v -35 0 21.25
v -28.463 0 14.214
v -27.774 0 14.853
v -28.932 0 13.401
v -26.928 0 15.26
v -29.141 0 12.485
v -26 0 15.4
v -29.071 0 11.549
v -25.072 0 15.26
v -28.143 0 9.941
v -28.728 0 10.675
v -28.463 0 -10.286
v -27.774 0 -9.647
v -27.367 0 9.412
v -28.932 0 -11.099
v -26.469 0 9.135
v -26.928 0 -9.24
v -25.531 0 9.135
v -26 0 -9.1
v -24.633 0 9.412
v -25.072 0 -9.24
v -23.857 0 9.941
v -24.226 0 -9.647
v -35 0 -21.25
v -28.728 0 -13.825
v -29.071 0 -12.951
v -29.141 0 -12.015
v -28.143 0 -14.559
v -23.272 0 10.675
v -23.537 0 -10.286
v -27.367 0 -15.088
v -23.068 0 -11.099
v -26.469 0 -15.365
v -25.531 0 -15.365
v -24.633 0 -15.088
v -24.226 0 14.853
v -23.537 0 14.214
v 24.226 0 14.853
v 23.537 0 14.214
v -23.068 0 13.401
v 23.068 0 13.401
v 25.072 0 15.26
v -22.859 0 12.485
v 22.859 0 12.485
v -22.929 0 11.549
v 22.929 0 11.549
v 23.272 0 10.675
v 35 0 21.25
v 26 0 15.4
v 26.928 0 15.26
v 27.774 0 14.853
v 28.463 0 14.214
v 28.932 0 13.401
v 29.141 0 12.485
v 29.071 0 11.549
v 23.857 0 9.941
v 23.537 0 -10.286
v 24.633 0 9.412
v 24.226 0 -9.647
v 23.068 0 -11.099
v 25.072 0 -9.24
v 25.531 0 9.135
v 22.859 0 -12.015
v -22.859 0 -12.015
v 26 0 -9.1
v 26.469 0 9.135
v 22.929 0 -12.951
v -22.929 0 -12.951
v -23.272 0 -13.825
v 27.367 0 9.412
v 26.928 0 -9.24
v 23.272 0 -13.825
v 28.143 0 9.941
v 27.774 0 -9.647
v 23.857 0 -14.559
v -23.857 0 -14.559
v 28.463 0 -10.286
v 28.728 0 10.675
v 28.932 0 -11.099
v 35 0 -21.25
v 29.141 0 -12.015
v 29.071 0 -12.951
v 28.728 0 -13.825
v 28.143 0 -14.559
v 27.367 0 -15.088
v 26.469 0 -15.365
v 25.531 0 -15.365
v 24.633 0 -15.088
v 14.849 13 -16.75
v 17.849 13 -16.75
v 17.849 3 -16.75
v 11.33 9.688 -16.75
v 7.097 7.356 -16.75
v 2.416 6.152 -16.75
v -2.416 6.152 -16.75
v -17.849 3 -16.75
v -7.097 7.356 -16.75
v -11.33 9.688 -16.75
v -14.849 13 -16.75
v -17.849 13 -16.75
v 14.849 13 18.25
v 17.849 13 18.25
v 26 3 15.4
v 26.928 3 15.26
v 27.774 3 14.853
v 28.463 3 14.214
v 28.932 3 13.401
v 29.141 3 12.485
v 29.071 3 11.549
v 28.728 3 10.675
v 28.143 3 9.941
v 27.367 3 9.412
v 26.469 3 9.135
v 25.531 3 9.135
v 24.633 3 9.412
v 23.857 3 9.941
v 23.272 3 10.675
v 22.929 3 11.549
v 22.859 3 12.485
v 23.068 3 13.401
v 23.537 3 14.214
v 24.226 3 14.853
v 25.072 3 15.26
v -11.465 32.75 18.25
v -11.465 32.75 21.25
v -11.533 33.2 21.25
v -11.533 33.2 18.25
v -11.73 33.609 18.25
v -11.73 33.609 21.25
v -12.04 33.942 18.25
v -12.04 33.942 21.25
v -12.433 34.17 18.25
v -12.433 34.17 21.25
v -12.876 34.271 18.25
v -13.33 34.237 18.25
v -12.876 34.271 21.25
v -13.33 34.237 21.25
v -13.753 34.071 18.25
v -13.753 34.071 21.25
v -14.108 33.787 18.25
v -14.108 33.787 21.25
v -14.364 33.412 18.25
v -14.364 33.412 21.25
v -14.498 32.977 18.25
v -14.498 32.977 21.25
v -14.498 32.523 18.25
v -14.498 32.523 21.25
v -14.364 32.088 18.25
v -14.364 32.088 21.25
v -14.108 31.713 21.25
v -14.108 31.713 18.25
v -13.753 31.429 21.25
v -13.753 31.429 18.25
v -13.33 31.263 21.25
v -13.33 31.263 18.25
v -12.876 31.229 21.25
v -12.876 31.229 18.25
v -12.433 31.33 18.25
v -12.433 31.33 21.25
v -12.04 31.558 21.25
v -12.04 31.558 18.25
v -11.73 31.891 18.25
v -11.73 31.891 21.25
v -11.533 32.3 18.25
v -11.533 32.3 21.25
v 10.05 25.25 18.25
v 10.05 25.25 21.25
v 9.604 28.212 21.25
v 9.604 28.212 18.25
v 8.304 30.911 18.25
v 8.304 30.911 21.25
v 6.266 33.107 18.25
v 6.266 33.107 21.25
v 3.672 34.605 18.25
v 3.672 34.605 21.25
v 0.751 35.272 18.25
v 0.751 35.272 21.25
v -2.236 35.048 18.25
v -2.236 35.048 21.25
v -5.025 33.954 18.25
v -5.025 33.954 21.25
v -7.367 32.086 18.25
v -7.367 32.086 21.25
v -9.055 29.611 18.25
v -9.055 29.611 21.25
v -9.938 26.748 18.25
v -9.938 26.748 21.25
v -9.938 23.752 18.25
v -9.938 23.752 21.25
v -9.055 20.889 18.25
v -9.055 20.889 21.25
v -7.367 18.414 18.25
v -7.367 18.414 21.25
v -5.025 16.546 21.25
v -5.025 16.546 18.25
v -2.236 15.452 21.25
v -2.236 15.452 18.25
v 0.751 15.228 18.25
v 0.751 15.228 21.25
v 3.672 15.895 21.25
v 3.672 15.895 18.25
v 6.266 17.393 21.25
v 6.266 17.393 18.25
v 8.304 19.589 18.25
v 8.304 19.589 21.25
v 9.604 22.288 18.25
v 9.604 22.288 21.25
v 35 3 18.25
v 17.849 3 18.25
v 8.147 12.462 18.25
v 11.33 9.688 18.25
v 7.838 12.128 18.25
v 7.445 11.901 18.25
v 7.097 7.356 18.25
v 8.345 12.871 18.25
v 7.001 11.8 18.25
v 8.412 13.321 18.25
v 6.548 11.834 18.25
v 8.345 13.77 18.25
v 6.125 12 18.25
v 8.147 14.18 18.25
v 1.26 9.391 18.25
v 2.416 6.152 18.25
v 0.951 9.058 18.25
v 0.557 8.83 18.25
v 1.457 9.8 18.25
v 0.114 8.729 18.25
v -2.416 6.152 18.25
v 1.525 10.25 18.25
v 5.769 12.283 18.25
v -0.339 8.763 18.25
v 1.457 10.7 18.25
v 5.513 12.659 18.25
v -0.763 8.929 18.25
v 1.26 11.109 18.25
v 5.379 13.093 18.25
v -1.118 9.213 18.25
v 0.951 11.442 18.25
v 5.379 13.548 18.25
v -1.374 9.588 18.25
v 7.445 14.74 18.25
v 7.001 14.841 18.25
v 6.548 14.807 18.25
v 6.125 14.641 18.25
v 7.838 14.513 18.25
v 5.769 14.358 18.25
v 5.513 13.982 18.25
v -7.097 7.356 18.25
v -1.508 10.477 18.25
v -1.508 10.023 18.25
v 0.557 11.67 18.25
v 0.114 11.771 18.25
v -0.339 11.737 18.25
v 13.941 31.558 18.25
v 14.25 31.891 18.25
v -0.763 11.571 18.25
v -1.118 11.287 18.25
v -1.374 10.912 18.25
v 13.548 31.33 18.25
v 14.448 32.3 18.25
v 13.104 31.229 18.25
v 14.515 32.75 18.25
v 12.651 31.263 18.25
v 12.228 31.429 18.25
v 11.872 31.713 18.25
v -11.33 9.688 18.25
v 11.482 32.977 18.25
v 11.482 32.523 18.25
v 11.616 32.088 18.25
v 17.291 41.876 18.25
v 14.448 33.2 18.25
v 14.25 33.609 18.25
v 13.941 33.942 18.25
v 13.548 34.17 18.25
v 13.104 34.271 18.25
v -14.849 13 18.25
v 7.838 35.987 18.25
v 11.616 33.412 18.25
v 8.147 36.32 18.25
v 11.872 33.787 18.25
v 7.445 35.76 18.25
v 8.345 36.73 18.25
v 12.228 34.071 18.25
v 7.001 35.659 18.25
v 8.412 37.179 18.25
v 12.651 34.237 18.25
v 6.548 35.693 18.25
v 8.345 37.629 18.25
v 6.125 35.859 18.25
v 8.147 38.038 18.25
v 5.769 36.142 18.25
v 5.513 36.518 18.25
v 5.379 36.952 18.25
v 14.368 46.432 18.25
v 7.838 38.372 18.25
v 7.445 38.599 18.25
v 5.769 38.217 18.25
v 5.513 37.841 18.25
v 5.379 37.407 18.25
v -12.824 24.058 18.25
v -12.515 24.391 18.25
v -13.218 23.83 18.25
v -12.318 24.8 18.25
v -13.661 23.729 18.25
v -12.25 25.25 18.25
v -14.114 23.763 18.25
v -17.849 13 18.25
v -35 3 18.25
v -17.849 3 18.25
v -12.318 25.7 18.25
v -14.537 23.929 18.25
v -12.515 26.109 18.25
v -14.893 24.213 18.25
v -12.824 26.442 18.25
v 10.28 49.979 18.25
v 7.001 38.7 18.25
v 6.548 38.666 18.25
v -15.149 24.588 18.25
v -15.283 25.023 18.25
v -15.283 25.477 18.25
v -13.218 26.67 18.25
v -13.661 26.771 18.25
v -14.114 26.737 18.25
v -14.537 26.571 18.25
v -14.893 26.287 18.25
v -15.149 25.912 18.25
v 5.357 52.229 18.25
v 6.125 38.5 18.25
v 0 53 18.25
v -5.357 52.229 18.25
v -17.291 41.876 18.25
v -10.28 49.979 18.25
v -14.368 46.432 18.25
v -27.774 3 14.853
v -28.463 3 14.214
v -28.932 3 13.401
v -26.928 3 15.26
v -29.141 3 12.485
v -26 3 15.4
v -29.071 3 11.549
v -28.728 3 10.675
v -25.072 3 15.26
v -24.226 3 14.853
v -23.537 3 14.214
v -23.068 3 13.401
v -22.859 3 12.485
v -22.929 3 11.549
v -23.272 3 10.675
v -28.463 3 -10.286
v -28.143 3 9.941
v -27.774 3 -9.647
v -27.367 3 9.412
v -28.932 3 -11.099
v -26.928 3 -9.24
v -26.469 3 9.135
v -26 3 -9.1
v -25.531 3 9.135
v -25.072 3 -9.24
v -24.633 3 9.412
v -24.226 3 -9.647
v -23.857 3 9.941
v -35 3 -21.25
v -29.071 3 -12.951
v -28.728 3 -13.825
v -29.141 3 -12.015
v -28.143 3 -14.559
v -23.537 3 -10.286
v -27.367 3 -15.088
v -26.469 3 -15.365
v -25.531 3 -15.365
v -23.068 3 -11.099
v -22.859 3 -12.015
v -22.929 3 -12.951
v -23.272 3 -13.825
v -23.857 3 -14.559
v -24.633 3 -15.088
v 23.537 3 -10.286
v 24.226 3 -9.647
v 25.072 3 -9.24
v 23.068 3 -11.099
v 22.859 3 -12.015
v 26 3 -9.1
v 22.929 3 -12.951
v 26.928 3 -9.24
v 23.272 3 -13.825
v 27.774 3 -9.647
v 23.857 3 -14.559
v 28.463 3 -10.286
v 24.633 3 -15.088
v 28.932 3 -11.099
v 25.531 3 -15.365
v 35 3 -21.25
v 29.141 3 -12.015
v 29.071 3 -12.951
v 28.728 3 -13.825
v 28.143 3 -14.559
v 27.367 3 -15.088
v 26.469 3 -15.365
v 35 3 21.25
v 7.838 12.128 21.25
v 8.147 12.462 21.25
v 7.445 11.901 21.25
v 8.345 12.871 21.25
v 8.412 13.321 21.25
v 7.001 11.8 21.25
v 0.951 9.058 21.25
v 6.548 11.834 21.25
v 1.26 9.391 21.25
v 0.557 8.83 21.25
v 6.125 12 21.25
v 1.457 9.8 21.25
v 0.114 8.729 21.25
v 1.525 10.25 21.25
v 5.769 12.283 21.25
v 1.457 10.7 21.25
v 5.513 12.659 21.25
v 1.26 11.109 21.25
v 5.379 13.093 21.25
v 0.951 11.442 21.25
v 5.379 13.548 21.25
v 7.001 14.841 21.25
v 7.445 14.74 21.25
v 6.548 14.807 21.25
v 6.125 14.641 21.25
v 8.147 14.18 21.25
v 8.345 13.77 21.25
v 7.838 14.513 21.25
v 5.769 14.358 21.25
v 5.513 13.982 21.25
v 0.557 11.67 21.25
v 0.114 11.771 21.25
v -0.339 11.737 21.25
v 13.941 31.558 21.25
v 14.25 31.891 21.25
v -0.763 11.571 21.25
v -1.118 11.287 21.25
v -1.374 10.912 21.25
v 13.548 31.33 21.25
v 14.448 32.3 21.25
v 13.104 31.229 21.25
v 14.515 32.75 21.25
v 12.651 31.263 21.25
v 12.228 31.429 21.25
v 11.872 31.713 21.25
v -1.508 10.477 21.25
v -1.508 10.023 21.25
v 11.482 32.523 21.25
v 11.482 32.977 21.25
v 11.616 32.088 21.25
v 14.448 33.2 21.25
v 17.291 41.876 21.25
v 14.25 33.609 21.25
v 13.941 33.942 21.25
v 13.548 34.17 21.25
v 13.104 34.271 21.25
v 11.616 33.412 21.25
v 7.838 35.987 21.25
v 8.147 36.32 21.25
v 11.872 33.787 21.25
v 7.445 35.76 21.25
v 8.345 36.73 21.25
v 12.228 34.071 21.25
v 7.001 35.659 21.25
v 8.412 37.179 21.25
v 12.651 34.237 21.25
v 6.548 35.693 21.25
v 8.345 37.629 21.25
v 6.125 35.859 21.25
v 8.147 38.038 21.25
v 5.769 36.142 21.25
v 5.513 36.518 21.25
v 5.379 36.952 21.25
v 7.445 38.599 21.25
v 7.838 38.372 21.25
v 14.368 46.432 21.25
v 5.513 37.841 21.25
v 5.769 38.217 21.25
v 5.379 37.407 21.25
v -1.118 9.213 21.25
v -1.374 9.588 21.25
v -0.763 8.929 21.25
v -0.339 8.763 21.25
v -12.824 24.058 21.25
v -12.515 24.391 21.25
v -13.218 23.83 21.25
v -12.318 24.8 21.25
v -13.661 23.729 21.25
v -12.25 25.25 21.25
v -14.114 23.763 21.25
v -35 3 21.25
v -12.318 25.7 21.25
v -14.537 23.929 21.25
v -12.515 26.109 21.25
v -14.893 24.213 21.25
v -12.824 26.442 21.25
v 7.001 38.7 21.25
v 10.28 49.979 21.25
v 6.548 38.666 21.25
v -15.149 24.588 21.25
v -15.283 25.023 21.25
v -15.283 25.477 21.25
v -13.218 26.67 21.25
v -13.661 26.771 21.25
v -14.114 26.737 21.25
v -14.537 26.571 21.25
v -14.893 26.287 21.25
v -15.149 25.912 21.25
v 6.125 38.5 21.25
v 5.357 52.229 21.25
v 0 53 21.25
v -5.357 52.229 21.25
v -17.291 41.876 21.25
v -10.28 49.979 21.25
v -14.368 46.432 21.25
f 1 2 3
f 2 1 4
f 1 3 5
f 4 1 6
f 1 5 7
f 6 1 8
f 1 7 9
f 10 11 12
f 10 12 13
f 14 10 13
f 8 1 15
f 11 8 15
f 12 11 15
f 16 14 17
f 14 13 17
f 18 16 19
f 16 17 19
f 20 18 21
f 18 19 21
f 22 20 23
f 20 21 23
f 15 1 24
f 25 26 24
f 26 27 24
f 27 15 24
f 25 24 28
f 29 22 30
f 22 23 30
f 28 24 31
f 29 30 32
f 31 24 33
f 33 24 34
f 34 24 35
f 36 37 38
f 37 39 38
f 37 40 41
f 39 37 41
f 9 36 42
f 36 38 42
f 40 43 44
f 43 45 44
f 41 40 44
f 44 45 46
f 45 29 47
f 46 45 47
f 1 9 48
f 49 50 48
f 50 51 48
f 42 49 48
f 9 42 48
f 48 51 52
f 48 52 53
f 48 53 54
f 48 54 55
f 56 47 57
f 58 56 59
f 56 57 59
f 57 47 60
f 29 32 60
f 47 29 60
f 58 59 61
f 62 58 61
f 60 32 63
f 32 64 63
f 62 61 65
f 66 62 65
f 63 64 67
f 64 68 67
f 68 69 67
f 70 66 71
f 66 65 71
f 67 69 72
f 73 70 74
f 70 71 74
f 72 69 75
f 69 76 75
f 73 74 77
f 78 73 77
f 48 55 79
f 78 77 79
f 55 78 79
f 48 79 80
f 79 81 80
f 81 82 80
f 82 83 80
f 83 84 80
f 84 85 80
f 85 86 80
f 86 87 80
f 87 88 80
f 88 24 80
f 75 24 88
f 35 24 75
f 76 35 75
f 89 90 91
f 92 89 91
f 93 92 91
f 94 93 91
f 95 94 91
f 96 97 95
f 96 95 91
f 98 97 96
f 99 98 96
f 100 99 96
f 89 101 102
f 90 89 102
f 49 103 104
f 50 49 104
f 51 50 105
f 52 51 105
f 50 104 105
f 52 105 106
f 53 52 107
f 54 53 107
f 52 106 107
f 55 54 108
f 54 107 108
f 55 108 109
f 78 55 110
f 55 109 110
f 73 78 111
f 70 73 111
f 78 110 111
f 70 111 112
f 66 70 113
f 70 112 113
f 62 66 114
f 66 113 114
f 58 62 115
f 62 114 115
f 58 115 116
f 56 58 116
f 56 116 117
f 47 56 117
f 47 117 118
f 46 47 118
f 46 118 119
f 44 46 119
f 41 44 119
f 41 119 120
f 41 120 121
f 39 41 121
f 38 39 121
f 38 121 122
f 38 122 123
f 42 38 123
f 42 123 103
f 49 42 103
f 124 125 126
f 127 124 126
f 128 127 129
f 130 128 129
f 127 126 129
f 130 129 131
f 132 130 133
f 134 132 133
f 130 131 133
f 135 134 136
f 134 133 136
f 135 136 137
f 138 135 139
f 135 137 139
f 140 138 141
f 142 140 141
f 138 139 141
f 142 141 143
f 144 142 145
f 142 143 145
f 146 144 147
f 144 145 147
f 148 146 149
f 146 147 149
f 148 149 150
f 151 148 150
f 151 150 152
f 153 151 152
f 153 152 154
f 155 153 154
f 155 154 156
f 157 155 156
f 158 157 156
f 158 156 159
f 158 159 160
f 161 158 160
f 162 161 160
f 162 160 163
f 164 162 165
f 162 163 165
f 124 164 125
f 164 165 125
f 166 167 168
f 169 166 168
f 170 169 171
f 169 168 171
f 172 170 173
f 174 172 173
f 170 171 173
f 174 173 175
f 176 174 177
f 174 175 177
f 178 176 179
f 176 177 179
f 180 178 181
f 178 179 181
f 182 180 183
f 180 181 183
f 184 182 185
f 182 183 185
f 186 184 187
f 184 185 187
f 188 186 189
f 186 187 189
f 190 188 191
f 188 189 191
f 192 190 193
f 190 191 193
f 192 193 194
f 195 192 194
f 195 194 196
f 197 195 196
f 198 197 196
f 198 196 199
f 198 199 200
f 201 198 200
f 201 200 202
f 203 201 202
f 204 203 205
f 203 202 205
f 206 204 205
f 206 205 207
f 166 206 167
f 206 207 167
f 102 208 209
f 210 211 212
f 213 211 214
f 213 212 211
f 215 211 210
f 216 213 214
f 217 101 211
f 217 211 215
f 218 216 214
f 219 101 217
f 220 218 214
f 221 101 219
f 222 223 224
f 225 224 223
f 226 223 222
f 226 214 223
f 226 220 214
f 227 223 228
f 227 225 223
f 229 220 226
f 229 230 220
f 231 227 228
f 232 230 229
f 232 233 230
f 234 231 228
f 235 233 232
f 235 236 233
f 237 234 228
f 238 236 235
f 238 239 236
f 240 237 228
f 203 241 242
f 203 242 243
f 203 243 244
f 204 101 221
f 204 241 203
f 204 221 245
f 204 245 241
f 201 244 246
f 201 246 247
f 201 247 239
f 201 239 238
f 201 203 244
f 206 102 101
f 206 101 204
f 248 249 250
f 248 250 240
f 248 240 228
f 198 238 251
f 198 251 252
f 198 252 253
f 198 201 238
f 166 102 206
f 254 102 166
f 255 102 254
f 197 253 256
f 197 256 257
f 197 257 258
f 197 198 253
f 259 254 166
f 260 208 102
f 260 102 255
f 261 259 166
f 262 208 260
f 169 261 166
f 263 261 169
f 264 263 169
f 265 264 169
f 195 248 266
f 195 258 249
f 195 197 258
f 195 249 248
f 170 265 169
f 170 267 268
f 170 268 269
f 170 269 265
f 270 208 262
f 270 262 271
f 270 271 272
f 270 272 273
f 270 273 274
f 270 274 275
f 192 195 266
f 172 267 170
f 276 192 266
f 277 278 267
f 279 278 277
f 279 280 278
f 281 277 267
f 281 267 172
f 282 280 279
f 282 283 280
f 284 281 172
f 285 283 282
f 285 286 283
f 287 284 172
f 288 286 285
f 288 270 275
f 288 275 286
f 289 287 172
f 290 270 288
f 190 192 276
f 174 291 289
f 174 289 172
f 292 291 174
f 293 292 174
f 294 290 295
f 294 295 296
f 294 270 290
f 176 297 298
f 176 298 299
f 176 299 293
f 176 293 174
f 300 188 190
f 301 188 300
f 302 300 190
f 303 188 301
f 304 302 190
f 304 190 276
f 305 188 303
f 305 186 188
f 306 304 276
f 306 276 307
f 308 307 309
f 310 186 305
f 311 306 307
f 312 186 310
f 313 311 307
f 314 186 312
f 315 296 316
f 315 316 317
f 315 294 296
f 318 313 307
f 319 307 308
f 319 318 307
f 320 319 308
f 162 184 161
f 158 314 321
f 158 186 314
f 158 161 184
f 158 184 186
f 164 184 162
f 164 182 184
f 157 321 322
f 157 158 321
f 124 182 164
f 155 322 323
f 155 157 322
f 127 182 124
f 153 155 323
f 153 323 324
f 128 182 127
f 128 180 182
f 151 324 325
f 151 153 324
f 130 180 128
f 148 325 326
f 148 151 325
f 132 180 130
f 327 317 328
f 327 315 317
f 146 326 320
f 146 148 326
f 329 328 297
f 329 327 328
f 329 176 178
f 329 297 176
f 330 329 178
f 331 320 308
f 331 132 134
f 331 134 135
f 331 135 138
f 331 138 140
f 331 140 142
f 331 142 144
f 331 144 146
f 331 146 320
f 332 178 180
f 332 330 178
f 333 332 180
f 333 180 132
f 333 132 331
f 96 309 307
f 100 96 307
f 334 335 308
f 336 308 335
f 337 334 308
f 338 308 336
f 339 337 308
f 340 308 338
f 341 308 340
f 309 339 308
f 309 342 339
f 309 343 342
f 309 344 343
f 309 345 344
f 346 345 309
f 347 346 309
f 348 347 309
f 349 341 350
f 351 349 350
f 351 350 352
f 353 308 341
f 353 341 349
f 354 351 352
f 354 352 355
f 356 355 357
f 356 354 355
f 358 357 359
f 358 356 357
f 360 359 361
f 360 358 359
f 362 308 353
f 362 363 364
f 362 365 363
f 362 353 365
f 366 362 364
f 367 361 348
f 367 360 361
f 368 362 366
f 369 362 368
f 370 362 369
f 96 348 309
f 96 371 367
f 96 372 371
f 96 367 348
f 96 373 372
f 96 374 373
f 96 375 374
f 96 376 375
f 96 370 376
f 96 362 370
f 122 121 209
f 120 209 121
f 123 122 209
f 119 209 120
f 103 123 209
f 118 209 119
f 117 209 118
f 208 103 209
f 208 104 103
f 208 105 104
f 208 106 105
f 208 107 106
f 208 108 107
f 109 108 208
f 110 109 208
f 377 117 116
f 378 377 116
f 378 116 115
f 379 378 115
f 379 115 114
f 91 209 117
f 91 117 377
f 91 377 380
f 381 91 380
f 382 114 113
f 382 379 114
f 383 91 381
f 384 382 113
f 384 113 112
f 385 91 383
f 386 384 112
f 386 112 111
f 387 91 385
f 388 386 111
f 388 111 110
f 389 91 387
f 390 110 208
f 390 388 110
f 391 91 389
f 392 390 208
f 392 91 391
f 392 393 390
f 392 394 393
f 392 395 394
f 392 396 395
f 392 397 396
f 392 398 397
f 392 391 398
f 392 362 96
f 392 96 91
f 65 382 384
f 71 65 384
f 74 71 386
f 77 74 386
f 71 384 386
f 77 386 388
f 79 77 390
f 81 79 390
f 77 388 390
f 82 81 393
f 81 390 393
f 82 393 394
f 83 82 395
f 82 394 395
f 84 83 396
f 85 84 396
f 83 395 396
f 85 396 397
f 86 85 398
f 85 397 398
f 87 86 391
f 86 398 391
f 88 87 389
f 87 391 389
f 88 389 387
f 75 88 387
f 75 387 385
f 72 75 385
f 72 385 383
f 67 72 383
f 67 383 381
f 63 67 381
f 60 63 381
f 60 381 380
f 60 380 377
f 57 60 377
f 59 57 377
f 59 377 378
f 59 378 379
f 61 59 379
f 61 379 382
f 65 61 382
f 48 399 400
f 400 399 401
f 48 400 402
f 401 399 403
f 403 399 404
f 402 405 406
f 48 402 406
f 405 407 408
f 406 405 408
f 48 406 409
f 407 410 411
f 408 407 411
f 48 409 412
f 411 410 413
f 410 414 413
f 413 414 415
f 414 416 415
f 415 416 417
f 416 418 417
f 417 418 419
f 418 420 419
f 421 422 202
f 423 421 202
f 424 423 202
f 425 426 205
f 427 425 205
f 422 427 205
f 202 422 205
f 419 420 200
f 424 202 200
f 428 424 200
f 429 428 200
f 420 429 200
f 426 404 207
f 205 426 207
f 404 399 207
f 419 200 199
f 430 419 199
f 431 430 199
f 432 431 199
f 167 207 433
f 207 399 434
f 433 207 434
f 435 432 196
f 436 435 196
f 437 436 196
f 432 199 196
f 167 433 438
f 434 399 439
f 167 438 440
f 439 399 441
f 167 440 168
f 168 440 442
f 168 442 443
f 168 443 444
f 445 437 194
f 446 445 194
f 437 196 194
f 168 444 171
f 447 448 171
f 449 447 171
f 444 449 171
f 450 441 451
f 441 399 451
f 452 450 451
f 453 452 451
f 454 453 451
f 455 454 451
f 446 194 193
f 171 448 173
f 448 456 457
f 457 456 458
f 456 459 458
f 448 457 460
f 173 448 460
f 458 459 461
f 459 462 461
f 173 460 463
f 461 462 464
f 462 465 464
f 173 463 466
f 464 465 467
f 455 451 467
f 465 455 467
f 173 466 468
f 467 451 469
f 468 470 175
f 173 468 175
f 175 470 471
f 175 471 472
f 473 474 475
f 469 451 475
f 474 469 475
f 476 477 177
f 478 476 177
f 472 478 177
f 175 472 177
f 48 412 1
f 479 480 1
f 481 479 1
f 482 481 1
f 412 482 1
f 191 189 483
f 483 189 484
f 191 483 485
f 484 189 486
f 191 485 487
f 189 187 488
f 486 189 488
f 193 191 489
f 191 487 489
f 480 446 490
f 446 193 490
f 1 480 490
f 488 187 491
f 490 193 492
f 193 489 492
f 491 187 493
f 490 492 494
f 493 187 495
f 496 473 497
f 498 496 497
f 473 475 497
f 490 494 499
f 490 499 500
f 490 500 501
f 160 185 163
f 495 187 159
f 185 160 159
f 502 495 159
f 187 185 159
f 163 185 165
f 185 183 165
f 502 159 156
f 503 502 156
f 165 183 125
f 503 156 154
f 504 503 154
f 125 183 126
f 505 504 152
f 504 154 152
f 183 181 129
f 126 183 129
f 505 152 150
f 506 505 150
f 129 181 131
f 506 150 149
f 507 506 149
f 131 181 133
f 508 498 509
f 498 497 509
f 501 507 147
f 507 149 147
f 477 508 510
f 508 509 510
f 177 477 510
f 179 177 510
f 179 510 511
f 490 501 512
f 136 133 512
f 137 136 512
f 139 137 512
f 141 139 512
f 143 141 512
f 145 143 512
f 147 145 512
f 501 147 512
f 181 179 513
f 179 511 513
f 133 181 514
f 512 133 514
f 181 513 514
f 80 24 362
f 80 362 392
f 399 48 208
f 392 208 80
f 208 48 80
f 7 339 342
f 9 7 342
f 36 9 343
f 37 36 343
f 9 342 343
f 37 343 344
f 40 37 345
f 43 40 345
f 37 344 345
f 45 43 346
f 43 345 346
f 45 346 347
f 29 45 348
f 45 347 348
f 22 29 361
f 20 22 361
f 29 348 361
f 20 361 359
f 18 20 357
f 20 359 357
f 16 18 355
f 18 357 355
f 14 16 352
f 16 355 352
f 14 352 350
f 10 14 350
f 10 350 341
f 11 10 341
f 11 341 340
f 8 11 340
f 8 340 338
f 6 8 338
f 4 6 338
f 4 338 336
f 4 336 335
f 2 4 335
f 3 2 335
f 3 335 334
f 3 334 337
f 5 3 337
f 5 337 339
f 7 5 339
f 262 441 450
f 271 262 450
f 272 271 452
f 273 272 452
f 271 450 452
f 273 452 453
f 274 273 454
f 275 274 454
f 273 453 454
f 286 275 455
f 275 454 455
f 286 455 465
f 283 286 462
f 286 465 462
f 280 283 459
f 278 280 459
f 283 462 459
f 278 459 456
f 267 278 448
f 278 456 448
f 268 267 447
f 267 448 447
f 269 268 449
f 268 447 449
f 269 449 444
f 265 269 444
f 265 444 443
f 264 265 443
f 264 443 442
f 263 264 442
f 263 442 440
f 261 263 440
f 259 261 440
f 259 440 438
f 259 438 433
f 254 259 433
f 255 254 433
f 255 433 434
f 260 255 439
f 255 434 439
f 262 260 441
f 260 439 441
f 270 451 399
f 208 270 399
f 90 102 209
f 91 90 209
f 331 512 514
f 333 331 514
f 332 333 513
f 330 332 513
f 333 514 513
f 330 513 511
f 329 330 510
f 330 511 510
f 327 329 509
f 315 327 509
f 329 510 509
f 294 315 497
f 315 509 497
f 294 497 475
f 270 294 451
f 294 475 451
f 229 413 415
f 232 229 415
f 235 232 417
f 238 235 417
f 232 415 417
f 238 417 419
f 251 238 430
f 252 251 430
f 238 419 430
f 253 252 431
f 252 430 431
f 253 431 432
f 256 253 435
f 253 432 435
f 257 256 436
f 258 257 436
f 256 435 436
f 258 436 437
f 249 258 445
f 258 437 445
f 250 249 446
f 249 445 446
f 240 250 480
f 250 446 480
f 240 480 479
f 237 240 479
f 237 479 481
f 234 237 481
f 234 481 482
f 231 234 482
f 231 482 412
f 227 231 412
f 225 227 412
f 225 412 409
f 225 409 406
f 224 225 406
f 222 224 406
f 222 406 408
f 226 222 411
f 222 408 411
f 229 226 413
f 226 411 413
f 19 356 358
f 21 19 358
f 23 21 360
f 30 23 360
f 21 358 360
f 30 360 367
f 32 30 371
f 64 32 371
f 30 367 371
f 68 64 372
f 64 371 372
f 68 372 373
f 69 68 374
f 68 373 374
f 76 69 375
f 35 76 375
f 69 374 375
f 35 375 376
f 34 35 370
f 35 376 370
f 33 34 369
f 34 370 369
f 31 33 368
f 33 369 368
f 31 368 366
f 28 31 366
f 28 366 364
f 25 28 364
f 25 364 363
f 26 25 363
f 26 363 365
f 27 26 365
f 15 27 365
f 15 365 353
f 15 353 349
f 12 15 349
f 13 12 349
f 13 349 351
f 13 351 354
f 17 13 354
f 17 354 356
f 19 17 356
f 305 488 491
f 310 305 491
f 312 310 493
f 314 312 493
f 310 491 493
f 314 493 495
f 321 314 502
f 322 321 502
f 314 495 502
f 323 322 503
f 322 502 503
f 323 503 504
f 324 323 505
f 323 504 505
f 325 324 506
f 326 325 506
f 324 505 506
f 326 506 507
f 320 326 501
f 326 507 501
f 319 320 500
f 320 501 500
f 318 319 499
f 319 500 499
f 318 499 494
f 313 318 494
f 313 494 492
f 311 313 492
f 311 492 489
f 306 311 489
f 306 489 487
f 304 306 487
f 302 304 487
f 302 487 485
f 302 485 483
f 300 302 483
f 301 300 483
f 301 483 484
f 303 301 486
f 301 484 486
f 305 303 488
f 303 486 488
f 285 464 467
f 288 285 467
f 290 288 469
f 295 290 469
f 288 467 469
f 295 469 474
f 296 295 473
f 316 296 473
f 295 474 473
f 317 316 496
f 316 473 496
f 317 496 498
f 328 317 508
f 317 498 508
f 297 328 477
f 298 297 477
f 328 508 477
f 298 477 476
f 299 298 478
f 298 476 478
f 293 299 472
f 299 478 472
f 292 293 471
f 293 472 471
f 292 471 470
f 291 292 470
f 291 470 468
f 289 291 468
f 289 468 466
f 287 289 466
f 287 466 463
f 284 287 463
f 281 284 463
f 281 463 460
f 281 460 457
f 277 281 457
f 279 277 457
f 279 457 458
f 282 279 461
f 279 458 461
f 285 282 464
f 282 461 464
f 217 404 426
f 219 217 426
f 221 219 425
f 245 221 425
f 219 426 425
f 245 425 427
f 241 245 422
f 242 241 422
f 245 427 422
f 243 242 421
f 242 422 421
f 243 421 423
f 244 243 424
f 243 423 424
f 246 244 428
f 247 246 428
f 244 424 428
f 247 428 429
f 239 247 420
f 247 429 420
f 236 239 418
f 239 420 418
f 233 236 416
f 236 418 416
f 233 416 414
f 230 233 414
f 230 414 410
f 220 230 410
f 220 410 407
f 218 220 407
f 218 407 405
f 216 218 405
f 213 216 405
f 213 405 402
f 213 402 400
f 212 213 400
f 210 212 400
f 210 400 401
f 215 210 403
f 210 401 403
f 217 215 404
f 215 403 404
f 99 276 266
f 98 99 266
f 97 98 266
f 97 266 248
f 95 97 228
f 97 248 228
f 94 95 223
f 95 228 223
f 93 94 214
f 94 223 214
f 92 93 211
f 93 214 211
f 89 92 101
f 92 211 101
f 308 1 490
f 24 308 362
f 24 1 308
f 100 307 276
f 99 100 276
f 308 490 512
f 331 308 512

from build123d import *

# Parameters (mm, degrees)
SKETCH3_W           = 70
SKETCH3_H           = 42.5
BOSS_EXTRUDE1_DEPTH = 3
SKETCH4_R           = 10.05
SKETCH4_R_2         = 1.525
BOSS_EXTRUDE2_DEPTH = 3
BOSS_EXTRUDE3_DEPTH = 35
SKETCH6_R           = 3.15
CUT_EXTRUDE1_DEPTH  = 5


with BuildPart() as part:
    # Sketch3 → Boss-Extrude1 (new body)
    with BuildSketch(Plane(origin=(0, 0, 0), x_dir=(1, 0, 0), z_dir=(0, 1, 0))):
        Rectangle(SKETCH3_W, SKETCH3_H)
    extrude(amount=BOSS_EXTRUDE1_DEPTH)

    # Sketch4 → Boss-Extrude2 (add)
    with BuildSketch(Plane.XY.offset(21.25)):
        with BuildLine():
            Line((-35, 3), (-17.290526546, 41.876400939))
            ThreePointArc((-17.290526546, 41.876400939), (0, 53), (17.290526546, 41.876400939))
            Line((17.290526546, 41.876400939), (35, 3))
            Line((35, 3), (-35, 3))
        make_face()
        with Locations((0, 25.25)):
            Circle(SKETCH4_R, mode=Mode.SUBTRACT)
        with Locations((-13.774757254, 25.25)):
            Circle(SKETCH4_R_2, mode=Mode.SUBTRACT)
        with Locations((-12.990381057, 32.75)):
            Circle(SKETCH4_R_2, mode=Mode.SUBTRACT)
        with Locations((12.990381057, 32.75)):
            Circle(SKETCH4_R_2, mode=Mode.SUBTRACT)
        with Locations((6.887378627, 37.179289713)):
            Circle(SKETCH4_R_2, mode=Mode.SUBTRACT)
        with Locations((0, 10.25)):
            Circle(SKETCH4_R_2, mode=Mode.SUBTRACT)
        with Locations((6.887378627, 13.320710287)):
            Circle(SKETCH4_R_2, mode=Mode.SUBTRACT)
    extrude(amount=-BOSS_EXTRUDE2_DEPTH)

    # Sketch5 → Boss-Extrude3 (add)
    with BuildSketch(Plane(origin=(0, 0, 18.25), x_dir=(-1, 0, 0), z_dir=(0, 0, -1))):
        with BuildLine():
            Line((-17.849242405, 13), (-17.849242405, 3))
            Line((-17.849242405, 3), (17.849242405, 3))
            Line((17.849242405, 3), (17.849242405, 13))
            Line((17.849242405, 13), (14.849242405, 13))
            ThreePointArc((14.849242405, 13), (0, 6), (-14.849242405, 13))
            Line((-14.849242405, 13), (-17.849242405, 13))
        make_face()
    extrude(amount=BOSS_EXTRUDE3_DEPTH)

    # Sketch6 → Cut-Extrude1 (cut)
    with BuildSketch(Plane(origin=(0, 3, 0), x_dir=(1, 0, 0), z_dir=(0, 1, 0))):
        with Locations(Location((-26, 12.25, 0), (0, 0, 270))):
            Circle(SKETCH6_R)
        with Locations(Location((26, 12.25, 0), (0, 0, 270))):
            Circle(SKETCH6_R)
        with Locations(Location((26, -12.25, 0), (0, 0, 270))):
            Circle(SKETCH6_R)
        with Locations(Location((-26, -12.25, 0), (0, 0, 270))):
            Circle(SKETCH6_R)
    extrude(amount=-CUT_EXTRUDE1_DEPTH, mode=Mode.SUBTRACT)


solid = part.part
